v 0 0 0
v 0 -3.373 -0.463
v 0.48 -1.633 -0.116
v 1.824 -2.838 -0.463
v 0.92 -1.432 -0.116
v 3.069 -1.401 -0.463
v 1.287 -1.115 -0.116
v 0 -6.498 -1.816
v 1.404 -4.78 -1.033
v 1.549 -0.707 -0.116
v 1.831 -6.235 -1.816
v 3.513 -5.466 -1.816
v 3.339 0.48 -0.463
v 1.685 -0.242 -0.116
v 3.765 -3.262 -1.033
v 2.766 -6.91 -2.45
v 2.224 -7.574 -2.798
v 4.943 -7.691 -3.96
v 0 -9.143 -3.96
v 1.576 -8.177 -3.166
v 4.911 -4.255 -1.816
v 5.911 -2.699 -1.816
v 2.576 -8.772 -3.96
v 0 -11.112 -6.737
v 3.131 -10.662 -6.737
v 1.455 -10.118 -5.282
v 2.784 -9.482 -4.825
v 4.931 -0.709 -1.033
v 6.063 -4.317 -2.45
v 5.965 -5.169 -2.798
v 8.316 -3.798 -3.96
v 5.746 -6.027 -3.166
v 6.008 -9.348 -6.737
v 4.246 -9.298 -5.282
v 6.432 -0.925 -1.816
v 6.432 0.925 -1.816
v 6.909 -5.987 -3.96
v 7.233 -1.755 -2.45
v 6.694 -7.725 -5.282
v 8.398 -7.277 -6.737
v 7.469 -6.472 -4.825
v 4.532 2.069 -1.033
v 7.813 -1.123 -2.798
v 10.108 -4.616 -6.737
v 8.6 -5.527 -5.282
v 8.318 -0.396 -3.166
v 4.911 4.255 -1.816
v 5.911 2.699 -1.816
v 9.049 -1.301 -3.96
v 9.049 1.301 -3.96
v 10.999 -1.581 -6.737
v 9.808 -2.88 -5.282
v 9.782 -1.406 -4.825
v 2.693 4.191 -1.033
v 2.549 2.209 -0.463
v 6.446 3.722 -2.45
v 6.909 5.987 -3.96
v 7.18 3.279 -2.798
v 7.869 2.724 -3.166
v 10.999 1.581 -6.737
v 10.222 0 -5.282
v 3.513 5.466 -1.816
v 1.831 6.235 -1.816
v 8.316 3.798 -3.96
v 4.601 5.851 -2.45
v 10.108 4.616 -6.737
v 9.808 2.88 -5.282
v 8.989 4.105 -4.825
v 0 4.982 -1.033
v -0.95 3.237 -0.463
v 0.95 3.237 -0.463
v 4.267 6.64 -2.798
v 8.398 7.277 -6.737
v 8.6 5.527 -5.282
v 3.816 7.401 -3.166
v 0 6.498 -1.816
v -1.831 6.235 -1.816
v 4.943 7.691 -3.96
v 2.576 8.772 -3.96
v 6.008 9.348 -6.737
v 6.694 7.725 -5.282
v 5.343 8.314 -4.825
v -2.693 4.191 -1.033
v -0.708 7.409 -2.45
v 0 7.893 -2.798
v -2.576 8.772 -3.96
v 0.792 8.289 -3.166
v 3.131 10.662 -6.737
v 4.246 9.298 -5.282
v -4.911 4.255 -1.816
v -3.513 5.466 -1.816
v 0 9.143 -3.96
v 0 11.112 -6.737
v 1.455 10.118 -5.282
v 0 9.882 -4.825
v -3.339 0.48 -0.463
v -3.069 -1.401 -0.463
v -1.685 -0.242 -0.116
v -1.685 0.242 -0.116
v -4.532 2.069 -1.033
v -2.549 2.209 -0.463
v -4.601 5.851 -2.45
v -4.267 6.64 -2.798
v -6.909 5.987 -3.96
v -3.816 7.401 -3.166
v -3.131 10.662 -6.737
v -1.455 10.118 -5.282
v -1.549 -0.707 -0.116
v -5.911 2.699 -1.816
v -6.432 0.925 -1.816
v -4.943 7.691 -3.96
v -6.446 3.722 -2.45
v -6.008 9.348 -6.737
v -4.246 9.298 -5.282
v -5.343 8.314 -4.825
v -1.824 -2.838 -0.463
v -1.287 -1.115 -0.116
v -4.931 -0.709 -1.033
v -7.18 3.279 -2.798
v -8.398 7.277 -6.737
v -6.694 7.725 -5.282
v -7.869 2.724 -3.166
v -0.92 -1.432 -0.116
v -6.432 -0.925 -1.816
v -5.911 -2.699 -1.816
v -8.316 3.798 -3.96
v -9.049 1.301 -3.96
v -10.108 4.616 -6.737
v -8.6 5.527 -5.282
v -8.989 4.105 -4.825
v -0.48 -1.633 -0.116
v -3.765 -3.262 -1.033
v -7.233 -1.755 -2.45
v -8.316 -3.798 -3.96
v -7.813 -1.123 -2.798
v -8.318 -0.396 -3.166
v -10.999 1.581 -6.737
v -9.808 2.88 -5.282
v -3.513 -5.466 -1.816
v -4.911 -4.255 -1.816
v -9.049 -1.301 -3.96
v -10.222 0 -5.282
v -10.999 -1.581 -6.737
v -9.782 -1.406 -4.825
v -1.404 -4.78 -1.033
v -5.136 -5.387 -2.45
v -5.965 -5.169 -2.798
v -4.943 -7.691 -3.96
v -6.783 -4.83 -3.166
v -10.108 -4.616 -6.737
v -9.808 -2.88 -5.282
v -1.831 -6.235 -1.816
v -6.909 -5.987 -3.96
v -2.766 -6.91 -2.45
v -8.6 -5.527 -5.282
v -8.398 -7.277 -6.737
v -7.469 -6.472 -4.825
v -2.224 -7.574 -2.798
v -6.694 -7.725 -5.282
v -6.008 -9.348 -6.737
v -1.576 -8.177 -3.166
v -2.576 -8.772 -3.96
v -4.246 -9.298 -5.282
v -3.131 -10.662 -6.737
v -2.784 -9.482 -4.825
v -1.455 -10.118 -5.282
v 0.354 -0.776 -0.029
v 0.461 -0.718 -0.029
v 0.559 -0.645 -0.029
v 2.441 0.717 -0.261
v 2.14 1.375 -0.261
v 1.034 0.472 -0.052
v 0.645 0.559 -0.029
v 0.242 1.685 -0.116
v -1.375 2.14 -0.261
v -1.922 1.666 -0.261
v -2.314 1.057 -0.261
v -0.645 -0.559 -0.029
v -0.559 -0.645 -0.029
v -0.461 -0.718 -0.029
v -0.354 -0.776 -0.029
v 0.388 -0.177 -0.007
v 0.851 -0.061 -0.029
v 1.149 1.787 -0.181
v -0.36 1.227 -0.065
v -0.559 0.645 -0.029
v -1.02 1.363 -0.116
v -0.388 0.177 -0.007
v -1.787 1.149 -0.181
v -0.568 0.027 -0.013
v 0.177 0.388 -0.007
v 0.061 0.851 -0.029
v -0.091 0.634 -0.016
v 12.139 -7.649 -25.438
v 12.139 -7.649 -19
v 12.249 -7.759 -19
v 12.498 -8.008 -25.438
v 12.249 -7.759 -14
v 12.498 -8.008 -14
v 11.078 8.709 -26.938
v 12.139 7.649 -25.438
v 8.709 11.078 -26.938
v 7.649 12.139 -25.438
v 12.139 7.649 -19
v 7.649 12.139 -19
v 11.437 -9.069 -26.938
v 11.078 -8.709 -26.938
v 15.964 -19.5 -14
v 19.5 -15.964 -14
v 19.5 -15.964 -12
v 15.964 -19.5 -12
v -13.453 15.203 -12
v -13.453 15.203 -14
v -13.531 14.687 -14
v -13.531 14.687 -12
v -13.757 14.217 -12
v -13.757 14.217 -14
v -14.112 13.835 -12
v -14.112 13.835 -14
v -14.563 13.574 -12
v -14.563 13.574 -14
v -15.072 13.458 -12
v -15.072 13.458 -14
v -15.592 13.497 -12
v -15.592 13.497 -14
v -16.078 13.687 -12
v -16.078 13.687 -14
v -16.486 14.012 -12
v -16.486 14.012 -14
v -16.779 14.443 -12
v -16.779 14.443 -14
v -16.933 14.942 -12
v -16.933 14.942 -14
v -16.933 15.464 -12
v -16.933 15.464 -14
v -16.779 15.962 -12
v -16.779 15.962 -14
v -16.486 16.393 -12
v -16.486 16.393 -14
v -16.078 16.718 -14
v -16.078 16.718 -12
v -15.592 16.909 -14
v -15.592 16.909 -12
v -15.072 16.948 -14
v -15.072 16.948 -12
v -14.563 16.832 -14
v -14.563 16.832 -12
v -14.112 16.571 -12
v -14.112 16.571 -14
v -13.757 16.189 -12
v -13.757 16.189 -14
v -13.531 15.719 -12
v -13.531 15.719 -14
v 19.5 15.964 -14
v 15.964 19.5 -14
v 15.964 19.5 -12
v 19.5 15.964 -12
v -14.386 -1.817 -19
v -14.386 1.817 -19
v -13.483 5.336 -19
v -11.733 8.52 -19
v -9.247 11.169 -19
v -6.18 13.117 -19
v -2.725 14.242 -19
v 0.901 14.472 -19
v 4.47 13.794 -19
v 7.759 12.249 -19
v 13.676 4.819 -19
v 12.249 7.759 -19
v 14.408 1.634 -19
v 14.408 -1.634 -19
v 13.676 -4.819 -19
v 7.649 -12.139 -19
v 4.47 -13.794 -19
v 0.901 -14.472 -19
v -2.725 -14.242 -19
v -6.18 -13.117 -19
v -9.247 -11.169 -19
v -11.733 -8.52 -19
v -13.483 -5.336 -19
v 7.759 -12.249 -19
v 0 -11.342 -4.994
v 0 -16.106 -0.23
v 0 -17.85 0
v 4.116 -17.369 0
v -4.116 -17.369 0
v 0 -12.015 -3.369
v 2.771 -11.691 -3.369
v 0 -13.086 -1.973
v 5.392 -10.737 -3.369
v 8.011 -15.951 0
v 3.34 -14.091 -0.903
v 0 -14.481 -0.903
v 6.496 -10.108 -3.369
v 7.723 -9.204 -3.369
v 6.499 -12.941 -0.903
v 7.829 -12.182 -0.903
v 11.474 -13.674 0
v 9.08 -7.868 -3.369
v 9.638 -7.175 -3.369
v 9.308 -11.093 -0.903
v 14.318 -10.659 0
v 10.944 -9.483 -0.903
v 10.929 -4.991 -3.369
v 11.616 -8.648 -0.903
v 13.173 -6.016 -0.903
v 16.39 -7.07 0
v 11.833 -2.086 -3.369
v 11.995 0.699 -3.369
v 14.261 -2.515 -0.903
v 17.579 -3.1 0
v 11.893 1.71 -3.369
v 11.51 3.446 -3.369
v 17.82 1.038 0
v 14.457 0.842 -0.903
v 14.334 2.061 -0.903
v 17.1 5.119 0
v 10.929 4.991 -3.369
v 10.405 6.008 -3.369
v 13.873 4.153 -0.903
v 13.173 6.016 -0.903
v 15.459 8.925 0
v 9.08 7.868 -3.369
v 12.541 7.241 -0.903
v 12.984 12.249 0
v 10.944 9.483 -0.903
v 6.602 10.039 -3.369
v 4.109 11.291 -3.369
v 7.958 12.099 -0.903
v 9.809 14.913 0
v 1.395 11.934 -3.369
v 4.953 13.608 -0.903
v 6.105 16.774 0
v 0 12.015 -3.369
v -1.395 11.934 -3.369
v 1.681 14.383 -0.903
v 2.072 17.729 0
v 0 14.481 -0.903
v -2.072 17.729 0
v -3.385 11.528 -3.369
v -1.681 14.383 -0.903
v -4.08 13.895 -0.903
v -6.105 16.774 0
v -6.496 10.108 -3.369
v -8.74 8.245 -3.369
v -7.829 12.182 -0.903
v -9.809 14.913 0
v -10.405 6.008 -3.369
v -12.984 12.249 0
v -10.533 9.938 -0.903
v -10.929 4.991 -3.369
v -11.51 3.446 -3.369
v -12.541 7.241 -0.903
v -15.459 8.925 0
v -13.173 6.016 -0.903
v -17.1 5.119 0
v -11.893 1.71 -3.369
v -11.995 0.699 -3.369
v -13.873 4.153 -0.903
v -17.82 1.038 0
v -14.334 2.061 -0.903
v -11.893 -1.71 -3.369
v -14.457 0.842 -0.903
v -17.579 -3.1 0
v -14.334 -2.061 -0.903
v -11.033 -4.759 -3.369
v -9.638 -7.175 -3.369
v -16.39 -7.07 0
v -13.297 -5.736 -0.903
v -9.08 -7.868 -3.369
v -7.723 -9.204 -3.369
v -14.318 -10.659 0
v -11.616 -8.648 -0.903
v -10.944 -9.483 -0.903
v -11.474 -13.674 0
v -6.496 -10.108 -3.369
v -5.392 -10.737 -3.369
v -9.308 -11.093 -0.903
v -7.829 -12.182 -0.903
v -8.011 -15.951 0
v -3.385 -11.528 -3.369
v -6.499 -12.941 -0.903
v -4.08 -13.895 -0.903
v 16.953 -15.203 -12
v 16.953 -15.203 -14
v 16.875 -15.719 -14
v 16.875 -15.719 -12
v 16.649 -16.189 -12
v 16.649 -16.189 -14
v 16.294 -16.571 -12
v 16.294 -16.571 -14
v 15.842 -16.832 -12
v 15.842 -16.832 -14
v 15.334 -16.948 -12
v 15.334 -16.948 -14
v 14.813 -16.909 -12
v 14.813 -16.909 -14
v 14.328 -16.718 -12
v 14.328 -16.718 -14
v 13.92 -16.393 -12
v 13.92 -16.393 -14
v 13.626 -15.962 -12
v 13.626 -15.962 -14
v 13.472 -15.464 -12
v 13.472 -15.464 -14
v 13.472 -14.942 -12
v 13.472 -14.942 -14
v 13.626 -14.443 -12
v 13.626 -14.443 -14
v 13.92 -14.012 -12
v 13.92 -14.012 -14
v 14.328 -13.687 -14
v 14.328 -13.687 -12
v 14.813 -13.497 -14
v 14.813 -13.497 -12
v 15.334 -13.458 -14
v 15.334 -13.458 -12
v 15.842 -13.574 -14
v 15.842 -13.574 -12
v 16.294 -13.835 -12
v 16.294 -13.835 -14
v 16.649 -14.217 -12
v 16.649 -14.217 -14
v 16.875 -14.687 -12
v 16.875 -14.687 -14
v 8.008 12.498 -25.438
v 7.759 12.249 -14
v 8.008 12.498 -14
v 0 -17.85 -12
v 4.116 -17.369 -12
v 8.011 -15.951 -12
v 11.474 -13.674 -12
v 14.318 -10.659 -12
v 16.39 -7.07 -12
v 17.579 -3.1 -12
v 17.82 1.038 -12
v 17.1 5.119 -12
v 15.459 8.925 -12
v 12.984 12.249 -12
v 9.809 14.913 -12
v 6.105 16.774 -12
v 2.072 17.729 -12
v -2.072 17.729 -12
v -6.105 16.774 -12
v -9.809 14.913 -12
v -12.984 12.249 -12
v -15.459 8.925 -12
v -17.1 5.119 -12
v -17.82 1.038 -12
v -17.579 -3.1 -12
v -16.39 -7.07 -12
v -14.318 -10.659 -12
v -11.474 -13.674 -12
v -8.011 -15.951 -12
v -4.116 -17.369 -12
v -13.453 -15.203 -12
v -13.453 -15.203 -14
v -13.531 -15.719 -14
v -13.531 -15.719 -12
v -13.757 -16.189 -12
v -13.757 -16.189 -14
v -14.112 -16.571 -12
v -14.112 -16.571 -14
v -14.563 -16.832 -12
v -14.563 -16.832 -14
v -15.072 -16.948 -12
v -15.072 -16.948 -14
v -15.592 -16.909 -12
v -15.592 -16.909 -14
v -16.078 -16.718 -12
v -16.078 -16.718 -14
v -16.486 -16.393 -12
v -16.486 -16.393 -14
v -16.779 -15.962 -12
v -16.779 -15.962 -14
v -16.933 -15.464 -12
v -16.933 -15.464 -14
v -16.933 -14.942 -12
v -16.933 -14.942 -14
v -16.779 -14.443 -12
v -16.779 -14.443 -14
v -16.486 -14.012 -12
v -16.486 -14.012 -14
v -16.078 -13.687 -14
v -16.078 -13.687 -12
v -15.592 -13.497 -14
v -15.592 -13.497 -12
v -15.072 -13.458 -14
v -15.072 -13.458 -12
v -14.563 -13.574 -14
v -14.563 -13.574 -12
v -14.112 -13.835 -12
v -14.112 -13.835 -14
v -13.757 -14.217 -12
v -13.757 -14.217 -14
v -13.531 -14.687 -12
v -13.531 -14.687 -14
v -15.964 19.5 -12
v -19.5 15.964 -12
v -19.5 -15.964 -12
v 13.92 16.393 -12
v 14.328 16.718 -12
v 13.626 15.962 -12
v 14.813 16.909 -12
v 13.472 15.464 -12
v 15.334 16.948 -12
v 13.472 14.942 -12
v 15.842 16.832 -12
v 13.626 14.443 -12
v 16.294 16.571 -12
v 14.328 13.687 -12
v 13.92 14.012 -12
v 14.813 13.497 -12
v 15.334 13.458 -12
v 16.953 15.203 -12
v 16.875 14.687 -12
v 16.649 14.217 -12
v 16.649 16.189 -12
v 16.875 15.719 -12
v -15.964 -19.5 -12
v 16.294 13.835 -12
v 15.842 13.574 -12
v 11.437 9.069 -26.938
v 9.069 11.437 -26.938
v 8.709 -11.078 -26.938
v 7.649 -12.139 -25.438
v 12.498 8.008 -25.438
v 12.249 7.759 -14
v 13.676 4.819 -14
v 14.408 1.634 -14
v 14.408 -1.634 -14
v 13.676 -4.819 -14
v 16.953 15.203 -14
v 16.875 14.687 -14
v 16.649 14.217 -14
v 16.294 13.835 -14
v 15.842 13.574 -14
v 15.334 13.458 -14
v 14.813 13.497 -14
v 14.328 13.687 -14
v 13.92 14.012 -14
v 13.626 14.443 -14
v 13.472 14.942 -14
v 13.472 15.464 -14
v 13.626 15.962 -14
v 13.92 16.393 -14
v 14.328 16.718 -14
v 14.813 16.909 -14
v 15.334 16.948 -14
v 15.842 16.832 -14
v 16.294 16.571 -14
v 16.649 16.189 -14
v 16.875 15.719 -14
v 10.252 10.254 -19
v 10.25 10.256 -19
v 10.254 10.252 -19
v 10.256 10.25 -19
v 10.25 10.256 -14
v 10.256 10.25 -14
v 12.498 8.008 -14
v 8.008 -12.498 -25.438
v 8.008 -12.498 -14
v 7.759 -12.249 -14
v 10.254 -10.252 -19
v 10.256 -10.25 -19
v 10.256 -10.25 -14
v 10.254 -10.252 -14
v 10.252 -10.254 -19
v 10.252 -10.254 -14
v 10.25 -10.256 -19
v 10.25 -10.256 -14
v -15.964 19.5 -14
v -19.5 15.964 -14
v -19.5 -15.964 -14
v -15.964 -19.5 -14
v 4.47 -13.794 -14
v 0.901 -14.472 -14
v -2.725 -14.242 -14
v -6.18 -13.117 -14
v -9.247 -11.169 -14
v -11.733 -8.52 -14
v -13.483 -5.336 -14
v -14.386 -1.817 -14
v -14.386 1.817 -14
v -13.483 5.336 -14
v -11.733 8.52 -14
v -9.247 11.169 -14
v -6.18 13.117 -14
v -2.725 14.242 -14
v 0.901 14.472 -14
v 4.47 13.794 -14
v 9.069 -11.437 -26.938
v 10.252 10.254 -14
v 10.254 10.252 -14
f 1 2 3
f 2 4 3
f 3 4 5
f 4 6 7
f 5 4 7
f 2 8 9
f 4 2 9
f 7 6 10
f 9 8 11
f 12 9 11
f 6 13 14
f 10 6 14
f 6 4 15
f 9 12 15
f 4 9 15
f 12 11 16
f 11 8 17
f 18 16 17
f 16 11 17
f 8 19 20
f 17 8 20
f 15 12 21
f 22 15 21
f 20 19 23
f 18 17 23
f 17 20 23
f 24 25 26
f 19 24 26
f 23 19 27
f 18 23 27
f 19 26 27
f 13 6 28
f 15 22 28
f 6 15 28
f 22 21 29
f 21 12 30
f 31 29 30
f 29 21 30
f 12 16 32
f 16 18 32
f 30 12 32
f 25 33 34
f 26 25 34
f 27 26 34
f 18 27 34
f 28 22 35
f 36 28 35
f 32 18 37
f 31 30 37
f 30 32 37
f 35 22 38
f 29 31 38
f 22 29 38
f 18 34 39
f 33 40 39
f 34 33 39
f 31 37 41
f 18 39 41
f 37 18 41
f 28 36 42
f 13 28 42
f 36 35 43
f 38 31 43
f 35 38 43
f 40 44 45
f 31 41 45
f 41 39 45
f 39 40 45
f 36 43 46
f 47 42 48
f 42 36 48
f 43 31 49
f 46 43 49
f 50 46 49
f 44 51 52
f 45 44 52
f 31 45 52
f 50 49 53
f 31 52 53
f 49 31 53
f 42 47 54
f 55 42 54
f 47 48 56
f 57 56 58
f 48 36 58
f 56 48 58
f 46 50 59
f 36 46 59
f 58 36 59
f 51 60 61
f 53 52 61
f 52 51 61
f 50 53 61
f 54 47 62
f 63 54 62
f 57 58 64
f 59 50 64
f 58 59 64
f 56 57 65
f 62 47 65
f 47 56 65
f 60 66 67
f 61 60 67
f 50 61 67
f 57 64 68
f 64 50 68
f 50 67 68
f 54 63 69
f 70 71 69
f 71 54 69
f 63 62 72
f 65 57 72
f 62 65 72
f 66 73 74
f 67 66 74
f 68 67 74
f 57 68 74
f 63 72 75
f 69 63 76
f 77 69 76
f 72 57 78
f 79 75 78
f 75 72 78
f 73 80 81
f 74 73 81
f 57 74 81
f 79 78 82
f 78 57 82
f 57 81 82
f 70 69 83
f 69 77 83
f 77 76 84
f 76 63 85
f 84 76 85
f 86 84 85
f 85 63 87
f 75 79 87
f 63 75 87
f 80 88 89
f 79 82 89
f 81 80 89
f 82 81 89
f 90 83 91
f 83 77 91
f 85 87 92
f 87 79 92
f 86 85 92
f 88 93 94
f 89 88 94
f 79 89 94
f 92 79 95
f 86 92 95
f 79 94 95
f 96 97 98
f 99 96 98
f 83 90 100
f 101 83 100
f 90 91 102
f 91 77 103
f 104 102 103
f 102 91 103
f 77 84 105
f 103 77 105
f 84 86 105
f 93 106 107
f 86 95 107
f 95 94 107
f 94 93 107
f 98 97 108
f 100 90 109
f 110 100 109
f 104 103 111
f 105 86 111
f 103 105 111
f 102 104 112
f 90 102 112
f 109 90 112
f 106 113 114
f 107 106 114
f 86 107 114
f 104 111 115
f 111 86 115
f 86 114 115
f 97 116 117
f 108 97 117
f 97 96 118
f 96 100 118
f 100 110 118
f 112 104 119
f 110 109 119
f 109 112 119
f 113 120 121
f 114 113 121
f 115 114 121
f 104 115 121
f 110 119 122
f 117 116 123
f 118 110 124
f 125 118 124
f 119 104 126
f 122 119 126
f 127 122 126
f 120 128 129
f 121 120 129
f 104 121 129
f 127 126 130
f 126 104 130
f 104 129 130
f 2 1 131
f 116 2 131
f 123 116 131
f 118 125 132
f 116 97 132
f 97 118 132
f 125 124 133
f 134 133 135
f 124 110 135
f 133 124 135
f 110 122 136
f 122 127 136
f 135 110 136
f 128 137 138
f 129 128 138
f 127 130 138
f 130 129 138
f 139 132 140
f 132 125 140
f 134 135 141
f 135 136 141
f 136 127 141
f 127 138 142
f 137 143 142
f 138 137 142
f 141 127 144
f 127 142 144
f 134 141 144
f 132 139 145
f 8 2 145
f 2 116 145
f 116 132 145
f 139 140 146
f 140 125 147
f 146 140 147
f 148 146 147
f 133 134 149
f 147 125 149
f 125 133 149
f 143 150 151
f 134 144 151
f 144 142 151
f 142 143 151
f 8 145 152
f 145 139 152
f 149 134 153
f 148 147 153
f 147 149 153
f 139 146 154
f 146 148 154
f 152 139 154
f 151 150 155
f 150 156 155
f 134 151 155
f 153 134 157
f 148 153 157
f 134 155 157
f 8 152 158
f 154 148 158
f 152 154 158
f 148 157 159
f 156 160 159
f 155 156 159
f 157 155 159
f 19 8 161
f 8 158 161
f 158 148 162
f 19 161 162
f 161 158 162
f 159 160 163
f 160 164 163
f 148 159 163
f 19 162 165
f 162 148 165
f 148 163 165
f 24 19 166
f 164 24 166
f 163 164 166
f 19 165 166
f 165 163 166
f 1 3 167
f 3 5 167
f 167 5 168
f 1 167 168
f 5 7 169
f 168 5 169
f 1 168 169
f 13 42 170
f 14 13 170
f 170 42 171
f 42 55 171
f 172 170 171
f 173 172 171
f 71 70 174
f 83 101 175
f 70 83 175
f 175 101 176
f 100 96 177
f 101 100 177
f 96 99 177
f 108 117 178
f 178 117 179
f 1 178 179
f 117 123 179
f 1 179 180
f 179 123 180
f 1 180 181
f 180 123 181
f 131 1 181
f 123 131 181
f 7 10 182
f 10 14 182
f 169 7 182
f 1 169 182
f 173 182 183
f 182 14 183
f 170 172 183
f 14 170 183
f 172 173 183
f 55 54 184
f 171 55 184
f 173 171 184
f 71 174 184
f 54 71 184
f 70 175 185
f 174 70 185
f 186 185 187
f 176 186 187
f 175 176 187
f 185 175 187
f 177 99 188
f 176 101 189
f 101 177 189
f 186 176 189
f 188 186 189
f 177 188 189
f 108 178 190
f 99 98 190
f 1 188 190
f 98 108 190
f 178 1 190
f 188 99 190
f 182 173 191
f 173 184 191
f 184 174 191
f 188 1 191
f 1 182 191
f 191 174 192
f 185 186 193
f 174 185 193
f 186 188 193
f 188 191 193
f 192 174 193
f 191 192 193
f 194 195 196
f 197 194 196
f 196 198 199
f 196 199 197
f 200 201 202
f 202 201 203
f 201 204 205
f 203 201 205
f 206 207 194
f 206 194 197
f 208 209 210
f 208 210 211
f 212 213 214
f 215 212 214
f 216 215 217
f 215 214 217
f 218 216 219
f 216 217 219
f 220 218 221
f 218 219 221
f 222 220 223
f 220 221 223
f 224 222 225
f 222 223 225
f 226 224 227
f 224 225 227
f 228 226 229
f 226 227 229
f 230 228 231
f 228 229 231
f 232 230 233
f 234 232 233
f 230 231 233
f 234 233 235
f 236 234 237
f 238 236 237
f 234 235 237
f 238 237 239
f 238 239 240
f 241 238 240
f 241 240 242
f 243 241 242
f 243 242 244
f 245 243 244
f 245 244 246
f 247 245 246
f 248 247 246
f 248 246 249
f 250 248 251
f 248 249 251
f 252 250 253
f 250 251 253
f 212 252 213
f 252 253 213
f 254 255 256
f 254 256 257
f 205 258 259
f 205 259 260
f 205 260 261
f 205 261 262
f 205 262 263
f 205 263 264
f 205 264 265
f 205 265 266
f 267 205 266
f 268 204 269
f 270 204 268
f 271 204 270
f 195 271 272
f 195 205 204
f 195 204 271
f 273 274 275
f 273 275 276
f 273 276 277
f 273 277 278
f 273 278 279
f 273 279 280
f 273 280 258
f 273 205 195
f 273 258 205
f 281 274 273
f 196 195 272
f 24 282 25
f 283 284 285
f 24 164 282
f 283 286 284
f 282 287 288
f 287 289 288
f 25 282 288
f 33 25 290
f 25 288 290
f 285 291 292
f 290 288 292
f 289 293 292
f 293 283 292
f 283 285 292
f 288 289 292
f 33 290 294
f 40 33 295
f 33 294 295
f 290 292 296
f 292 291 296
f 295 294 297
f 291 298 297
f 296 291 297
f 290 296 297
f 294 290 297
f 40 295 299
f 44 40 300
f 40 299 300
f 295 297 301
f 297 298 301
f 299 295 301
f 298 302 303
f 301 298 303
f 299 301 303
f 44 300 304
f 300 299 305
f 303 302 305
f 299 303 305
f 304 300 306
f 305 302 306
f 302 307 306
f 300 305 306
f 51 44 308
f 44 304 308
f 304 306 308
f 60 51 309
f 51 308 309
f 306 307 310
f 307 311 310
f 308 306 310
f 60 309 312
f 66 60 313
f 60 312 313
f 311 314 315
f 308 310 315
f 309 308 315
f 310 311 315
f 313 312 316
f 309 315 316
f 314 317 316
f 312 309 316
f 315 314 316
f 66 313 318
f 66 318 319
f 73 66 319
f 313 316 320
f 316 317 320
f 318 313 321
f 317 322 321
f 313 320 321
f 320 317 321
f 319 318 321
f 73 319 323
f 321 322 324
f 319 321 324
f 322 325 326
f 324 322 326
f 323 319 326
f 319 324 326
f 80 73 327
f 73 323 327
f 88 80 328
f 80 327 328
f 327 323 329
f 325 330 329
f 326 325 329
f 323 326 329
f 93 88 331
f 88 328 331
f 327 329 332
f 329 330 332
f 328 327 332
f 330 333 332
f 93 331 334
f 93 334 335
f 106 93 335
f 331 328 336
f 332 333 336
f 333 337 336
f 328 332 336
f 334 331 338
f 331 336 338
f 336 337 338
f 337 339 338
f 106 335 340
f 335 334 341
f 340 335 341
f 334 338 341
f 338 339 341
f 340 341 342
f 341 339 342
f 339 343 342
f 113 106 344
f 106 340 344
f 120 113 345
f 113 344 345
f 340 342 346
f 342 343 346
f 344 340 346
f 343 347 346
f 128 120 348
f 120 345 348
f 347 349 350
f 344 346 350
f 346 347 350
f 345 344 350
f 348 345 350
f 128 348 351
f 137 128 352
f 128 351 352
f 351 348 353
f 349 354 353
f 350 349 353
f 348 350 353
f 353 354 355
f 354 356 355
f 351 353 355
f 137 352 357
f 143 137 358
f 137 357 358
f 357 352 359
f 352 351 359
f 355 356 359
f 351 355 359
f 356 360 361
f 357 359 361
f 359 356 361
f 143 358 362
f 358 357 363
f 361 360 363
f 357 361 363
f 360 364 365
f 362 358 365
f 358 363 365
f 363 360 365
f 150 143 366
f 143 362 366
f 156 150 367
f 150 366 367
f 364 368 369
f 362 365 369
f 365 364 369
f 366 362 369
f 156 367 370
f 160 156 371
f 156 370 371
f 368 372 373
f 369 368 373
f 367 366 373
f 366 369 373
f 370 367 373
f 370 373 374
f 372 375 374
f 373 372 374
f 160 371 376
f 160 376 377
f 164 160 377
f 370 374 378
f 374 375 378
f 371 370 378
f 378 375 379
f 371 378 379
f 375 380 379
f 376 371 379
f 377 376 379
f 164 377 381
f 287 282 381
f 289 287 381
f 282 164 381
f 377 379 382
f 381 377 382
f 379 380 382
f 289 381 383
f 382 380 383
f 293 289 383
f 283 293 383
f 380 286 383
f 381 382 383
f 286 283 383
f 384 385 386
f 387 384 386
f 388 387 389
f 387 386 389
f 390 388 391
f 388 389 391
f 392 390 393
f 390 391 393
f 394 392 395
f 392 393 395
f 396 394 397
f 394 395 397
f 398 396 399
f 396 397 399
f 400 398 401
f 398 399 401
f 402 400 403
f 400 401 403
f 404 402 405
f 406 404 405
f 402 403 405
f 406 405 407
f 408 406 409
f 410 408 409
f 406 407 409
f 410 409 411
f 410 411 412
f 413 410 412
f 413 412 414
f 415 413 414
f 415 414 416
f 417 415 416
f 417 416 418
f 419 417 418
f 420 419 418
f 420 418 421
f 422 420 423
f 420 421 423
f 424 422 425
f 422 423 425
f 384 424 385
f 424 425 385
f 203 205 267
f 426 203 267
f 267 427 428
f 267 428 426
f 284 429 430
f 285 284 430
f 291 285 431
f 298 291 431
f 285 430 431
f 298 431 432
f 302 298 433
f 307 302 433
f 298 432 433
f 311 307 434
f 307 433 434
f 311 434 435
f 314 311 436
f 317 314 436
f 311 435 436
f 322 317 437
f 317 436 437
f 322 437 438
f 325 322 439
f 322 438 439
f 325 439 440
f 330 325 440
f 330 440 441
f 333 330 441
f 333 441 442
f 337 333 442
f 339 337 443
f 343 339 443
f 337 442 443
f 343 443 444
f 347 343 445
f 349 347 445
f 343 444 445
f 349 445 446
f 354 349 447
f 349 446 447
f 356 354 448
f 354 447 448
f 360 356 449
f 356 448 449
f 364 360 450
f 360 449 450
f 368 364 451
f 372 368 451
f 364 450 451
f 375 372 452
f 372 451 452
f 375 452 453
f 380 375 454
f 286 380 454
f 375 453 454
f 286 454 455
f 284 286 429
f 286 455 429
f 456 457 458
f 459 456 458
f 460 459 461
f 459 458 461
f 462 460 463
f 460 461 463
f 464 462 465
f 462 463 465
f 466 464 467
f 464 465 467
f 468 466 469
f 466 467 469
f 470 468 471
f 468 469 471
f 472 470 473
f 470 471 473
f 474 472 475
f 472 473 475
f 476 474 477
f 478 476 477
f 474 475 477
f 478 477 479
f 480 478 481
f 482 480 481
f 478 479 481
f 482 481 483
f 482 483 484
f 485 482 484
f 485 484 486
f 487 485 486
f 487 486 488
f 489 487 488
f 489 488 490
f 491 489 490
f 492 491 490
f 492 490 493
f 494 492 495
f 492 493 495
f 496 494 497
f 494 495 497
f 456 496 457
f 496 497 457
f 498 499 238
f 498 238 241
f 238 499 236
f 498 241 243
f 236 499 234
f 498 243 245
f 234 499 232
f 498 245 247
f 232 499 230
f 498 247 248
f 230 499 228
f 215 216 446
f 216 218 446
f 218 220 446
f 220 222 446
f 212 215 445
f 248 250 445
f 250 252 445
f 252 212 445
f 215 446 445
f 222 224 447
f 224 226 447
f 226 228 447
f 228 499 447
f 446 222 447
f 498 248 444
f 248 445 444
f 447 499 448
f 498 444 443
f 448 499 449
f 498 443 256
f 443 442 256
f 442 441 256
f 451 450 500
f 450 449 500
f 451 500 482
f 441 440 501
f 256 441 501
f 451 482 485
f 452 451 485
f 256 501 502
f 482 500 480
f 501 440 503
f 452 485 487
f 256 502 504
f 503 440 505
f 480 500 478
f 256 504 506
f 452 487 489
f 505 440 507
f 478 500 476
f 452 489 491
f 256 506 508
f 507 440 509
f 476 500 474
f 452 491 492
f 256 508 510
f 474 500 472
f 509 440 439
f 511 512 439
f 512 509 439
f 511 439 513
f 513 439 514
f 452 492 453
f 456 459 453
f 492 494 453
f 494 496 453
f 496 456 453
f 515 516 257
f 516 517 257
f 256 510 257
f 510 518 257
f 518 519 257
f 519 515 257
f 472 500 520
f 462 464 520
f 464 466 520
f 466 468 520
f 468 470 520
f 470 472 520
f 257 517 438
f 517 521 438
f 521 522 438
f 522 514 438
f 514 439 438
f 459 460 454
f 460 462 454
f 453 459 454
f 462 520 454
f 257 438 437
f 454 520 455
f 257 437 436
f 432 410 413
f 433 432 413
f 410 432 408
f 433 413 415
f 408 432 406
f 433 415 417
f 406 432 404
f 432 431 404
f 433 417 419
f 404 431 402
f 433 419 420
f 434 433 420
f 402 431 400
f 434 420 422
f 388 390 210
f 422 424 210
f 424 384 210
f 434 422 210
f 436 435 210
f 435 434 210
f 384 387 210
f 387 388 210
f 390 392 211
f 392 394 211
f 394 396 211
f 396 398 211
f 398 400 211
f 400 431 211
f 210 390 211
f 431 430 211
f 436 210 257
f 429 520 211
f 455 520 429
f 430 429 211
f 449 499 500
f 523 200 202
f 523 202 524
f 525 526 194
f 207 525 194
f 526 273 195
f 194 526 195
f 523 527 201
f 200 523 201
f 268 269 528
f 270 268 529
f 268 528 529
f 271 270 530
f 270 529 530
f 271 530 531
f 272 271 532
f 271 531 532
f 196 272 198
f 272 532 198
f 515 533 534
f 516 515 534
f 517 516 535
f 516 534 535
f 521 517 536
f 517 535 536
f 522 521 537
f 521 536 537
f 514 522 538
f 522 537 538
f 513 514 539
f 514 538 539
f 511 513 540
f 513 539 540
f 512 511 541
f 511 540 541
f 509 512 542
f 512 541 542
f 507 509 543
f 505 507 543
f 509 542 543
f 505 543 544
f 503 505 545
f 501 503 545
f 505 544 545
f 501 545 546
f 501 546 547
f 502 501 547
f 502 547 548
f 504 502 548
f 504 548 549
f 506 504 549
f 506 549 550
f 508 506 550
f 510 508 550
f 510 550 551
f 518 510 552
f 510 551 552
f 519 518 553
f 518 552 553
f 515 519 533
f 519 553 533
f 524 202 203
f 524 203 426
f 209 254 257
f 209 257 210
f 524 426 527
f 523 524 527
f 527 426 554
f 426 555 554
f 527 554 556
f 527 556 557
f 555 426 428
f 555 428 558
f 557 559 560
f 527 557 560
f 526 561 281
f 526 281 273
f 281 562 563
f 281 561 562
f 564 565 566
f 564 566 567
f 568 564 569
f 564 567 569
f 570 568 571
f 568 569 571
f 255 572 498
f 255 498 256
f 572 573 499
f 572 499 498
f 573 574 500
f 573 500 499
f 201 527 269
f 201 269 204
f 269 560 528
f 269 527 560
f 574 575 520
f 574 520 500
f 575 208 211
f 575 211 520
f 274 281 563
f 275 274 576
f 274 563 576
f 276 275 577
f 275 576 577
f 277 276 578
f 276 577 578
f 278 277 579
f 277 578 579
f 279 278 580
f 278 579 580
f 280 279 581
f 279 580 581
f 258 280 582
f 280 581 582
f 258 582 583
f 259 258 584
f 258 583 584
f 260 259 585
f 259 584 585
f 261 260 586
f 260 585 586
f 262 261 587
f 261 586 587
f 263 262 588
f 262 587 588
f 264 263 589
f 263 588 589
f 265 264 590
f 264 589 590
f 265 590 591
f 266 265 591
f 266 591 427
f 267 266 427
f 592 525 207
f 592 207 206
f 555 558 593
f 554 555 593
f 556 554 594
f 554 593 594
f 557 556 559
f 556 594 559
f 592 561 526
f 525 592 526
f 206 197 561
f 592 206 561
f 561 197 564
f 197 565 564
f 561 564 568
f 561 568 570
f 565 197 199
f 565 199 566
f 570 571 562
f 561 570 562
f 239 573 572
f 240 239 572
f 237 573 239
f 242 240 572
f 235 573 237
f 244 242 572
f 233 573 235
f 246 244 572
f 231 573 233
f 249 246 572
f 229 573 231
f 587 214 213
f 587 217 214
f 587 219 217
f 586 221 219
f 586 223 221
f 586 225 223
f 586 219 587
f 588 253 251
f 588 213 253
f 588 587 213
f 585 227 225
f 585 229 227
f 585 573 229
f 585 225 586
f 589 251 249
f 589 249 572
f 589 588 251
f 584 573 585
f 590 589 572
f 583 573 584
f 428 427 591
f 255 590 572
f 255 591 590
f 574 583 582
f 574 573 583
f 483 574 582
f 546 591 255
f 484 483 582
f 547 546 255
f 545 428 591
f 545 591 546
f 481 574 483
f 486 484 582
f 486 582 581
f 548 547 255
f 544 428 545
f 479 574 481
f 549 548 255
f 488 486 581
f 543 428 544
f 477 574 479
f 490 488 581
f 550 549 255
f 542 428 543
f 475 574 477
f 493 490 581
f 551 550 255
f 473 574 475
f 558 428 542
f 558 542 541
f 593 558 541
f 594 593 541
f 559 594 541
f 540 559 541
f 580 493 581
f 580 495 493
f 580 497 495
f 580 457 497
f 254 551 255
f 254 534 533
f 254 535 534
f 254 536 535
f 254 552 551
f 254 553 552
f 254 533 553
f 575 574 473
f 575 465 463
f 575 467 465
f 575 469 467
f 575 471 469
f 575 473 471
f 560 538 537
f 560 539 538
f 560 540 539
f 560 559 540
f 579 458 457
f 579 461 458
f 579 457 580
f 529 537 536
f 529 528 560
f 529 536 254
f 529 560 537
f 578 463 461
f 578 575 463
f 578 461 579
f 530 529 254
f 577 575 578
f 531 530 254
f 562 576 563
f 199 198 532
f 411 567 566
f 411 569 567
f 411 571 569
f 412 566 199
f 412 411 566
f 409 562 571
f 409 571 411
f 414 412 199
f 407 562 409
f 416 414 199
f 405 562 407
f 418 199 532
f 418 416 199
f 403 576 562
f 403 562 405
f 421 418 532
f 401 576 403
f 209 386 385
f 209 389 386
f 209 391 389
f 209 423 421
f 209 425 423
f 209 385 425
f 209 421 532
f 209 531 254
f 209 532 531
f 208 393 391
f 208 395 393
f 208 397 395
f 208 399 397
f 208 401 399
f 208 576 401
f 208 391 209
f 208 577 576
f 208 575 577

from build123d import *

# Parameters (mm, degrees)
F2_R     = 1.75
F3_DEPTH = 2
F4_R     = 14.5
F5_DEPTH = 5
F7_DEPTH = 12.9375
F8_SIZE  = 1.5


with BuildPart() as f1:
    # F0 (on Right) → F1 (revolve)
    with BuildSketch(Plane.YZ):
        with BuildLine():
            ThreePointArc((-11.1125, -6.7375), (-13.085868, -1.973368), (-17.85, 0))
            Line((-17.85, 0), (-17.85, -14))
            Line((-17.85, -14), (0, -14))
            Line((0, -14), (0, 0))
            ThreePointArc((0, 0), (-6.497722, -1.815933), (-11.1125, -6.7375))
        make_face()
    revolve(axis=Axis((0, 0, 9.125761), (0, 0, 1)))

    # F2 (on face) → F3 (join)
    with BuildSketch(Plane(origin=(0, 0, -14), x_dir=(1, 0, 0), z_dir=(0, 0, -1))):
        Polygon((-15.964466, -19.5), (0, -19.5), (15.964466, -19.5), (19.5, -15.964466), (19.5, 0), (19.5, 15.964466), (15.964466, 19.5), (0, 19.5), (-15.964466, 19.5), (-19.5, 15.964466), (-19.5, 0), (-19.5, -15.964466), align=None)
        with Locations((-15.202796, -15.202796)):
            Circle(F2_R, mode=Mode.SUBTRACT)
        with Locations((15.202796, -15.202796)):
            Circle(F2_R, mode=Mode.SUBTRACT)
        with Locations((-15.202796, 15.202796)):
            Circle(F2_R, mode=Mode.SUBTRACT)
        with Locations((15.202796, 15.202796)):
            Circle(F2_R, mode=Mode.SUBTRACT)
    extrude(amount=-F3_DEPTH)

    # F4 (on face) → F5 (join)
    with BuildSketch(Plane(origin=(0, 0, -14), x_dir=(1, 0, 0), z_dir=(0, 0, -1))):
        Circle(F4_R)
    extrude(amount=F5_DEPTH)

    # F6 (on face) → F7 (join)
    with BuildSketch(Plane(origin=(0, 0, -14), x_dir=(1, 0, 0), z_dir=(0, 0, -1))):
        Polygon((12.498112, 8.007984), (8.007984, 12.498112), (7.648774, 12.138902), (12.138902, 7.648774), align=None)
        Polygon((12.498112, -8.007984), (12.138902, -7.648774), (7.648774, -12.138902), (8.007984, -12.498112), align=None)
    extrude(amount=F7_DEPTH)

    # F8
    f8_edges = [f1.edges().sort_by_distance(p)[0] for p in [
        (12.318507, 7.828379, -26.9375),
        (7.828379, 12.318507, -26.9375),
        (7.828379, -12.318507, -26.9375),
        (12.318507, -7.828379, -26.9375),
    ]]
    chamfer(f8_edges, length=F8_SIZE)


solid = f1.part
